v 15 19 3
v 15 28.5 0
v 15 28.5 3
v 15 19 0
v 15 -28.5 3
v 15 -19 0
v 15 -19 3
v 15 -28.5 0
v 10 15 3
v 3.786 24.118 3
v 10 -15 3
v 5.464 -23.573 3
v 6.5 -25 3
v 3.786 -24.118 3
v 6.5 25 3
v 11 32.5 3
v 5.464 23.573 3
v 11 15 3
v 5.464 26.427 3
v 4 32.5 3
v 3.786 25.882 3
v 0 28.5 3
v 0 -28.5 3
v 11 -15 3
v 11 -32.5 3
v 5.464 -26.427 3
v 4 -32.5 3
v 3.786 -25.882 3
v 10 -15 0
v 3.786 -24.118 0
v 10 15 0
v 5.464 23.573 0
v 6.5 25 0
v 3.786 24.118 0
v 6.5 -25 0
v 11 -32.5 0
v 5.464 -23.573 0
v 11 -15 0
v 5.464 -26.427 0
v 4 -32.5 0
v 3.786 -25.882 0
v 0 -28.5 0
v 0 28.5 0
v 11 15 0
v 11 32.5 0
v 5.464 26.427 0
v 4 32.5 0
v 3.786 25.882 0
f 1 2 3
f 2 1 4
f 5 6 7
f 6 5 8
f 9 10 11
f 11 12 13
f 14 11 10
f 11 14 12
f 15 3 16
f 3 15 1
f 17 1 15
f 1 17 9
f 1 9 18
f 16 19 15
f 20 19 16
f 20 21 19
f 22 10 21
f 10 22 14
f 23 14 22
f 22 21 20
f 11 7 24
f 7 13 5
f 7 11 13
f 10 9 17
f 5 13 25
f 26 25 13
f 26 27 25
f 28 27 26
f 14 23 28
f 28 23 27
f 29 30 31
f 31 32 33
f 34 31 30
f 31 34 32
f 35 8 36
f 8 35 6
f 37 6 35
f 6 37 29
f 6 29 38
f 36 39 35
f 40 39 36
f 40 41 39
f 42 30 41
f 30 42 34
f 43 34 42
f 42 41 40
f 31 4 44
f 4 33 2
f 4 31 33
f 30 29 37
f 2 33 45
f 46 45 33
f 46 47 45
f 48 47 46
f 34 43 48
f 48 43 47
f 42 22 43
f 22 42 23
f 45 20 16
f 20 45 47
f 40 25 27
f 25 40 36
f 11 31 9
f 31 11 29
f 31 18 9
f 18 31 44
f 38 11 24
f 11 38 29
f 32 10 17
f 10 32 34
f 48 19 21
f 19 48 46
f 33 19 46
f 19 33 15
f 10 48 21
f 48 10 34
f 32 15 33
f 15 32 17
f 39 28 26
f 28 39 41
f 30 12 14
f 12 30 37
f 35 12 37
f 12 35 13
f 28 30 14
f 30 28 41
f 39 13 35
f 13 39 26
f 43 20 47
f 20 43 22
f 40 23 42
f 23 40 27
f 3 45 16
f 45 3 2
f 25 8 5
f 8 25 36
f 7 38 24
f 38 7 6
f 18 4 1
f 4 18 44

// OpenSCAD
// file: config_4x5.scad
/*
This is the base configuration file for the 4x5" format
# we are not using the exact ANSI measures, but slightly rounded measures for slight simplification
*/
vStabilizerTotal_h = 7;

// general tolerance
vTolerance = 0.2;

// sheet film and cassette measurements (roughly based on the ANSI measurements)
vFilmSheet_l = 127;
vFilmSheet_w = 102;
vCassette_l = 160; // A min
vCassette_w = 121; // B max
vCassette_h = 13.2; // C max
vLightTrap_l = 2; // M2
vLightTrap_w = vCassette_w;
vLightTrap_h = 1.5; // M1
vLightTrap_offsetX = 141; // G max
vFilmWindow_l = 121;
vFilmWindow_w = 101;
vFilmWindow_offsetX = 16;
vGroundGlass_offsetZ = 5;

// Graflok
vGraflok_h = 6; // this is not the official measurement, just measured from a camera 

// lens board measures (we are using Wista/Technika-style lensboards)
vLensboard_l = 100;
vLensboard_w = 97;
vLensboard_h = 2;
vLensboard_offsetX = -(vLensboard_l+3)/2; // caution: we have an asymetric offset!
vLensboard_offsetY = -vLensboard_w/2;
vLensboardHole_d = 85;
vLensboardLighttrap_d = 89;
vLensboardLighttrap_h = 1+vTolerance;

// bellows frame measures - the bellows frame design is derived from standardcameras.com
// back frame
vBellowsBackInner_l = 144; //???? check and replace with the measurement from your bellows!
vBellowsBackInner_w = vBellowsBackInner_l;
vBellowsBackOuter_l = vBellowsBackInner_l+1;
vBellowsBackOuter_w = vBellowsBackOuter_l;

vBellowsBackFrameOuter_l = 159;
vBellowsBackFrameOuter_w = vBellowsBackFrameOuter_l;
vBellowsBackFrameOuter_h = 7;
vBellowsBackFrameInner_l = 135;
vBellowsBackFrameInner_w = vBellowsBackFrameInner_l;
vBellowsBackFrameInner_h = 5;

vBellowsBackLightTrapOuter_l = vBellowsBackFrameInner_l+2*2;
vBellowsBackLightTrapOuter_w = vBellowsBackLightTrapOuter_l;
vBellowsBackLightTrap_h = 3;

//vBellowsBackFrameScrewHole_d = 2;
//vBellowsBackFrameScrewHole_h = 10;
vBellowsBackFrameScrewHole_offsetXY = 70;
vBellowsBackFrameScrewHole_offsetZ = vBellowsBackFrameOuter_h/2;

// front frame
vBellowsFrontInner_l = 94; //???? check and replace with the measurement from your bellows!
vBellowsFrontInner_w = vBellowsFrontInner_l;
vBellowsFrontOuter_l = vBellowsFrontInner_l+1;
vBellowsFrontOuter_w = vBellowsFrontOuter_l;

vBellowsFrontFrameOuter_l = 104;
vBellowsFrontFrameOuter_w = vBellowsFrontFrameOuter_l;
vBellowsFrontFrameOuter_h = 7;
vBellowsFrontFrameInner_l = 82;
vBellowsFrontFrameInner_w = vBellowsFrontFrameInner_l;
vBellowsFrontFrameInner_h = 5;

vBellowsFrontLightTrapOuter_l = vBellowsFrontFrameInner_l+2*2;
vBellowsFrontLightTrapOuter_w = vBellowsFrontLightTrapOuter_l;
vBellowsFrontLightTrap_h = 0;

//vBellowsFrontFrameScrewHole_d = 2;
//vBellowsFrontFrameScrewHole_h = 10;
vBellowsFrontFrameScrewHole_offsetXY = 40;
vBellowsFrontFrameScrewHole_offsetZ = vBellowsFrontFrameOuter_h/2;

// body dimensions
vWall_strength = 5;
vBodyOuter_l = 185; // make sure this is at least 4*vWall_strength larger than vBellowsBackFrameOuter_l!
vBodyOuter_w = 170; // make sure this is at least 2*vWall_strength larger than vBellowsBackFrameOuter_l!
vBodyOuter_h = 65;
vBodyEdge_r = vWall_strength;

// we will center our model on the Y axis and on the center of the bellows frame
// at least for the 4x5 version, we have to do an asymetric offset of 2.5mm on the X-axis 
vAsymOffsetX = -2.5;  

// back plate
vBackPlateLength = 160; // we will probably use about the same size as the bellows back frame
vBackPlateStrength = vWall_strength;

// hinges for front lid
vHingeInnerDistance = 100;
vHingeBaseWidth = 20;
vHingeHole = 4;

// lid lock measures
vLidLockBase_d = 8;
vLidLockHole_distance = 70;

// rail dimensions
vLowerRail_w = 90;
vUpperRail_w = vLowerRail_w;

// cutout for stop indents
vStopIndent_l = 4;
vStopIndent_h = 5;
vStopIndentDistance = 25; // shorter than 25 is not necessary
vStopIndent_offsetX = 20; // don't go shorter than 20 if you intend to use a 90mm lens!

// for all dovetails we use a base width of 5mm and a base height of 5mm
// we are applying tolerances to the inner AND outer part of a dovetail, in width and height
vDoveTail_w = 5;
vDoveTail_h = 5;
vDoveTail_tolerance = 0.2;

// front standard carrier / slider
// width is depending on vUpperRail_w
vSliderBase_w = vUpperRail_w + (4*vDoveTail_w);
vSliderBase_l = 40; // make sure to have enough space in the body.


// lever plate 
vLeverPlateBase_w = vUpperRail_w - (8*vDoveTail_w);
vLeverPlateBlock_w = 25;
vLeverPlateBlock_l = vSliderBase_l-(2*vDoveTail_w);

vFrontStandard_h = 130;
vFrontStandardSlot_h = vFrontStandard_h - 30;

// lensboard carrier
vFrontPlate_length = vSliderBase_w+6; // vSliderBase_w is a bit too tight for 4x5", so there we will add 5mm, for 5x7 vSliderBase_w is OK to get a squared lensboard carrier
vFrontPlate_width = vSliderBase_w; //vFrontPlate_length;
vFrontPlate_height = 16;
vEdgeCutCylinder = floor(sqrt(2*pow(vFrontPlate_width,2)))-5;

vTiltDovetailBase_d1 = 30;
vTiltDovetailBase_d2 = vTiltDovetailBase_d1+(2*vDoveTail_w);
vTiltDovetailBaseBlock_d = vTiltDovetailBase_d1+(4*vDoveTail_w);

vTiltDovetail_d1 = vTiltDovetailBase_d1-vTolerance;
vTiltDovetail_d2 = vTiltDovetailBase_d2-vTolerance;
vTiltDovetail_h = vDoveTail_w-vTolerance;

vTiltDovetailCutout_d1 = vTiltDovetailBase_d2+vTolerance;
vTiltDovetailCutout_d2 = vTiltDovetailBase_d1+vTolerance;

vAxisHole_d = 10+vTolerance;
vAxisHole_h = vDoveTail_w+vTolerance;

vTiltLockBolt_d = 12;
vTiltLockBolt_h = 14;
//vTiltLockBoltHole_d = 8;
//vTiltLockBoltHole_h = vTiltLockBolt_h;

vTiltHeight = 50;
vTiltRadius = vFrontPlate_length/2;
vTiltAngleMinus = -7;
vTiltAnglePlus = 7;
vTiltAxis_d = 10-vTolerance;

// focusing rod
vFocusingRod_d = 6;
vFocusingKnob_d = 25;
vFocusingKnob_h = 20;

// stabilizer measures (just the outer measures of our stabilizer block, not the tripod slider)
vStabilizerBase_l = 135;
vStabilizerBase_w = 90;  
vStabilizerBase_h = 7;
vStabilizerDovetailBase_w = 50;
// screw holes for the stabilizer
vLidHoleCount_x = 4;
vLidHoleDist_x = 35;
vLidHoleCount_y = 2;
vLidHoleDist_y = 60;


// screw diameters, length is individually set
vScrew1Hole_d = 3;
vScrew1ThreadHole_d = 2.2;
vScrew2Hole_d = 2;
vScrew2ThreadHole_d = 1.4;


// Dimensions for small heat set insert holes.
// Sized for M2 inserts, 3 mm depth, 3.5 mm max OD
// (may be labelled M2x3.5x3)
vInsertM2Hole_d = 3.2;
vInsertM2MinDepth_h = 4.0;
vInsertM2Size_d = 3.5;
vInsertM2Depth_h = 3.0;

// Dimensions for heat set insert holes.
// Sized for "Voron standard" M3 inserts, 4 mm depth, 5 mm max OD
// (variously labelled M3x4x5 or M3x5x4)
vInsertM3Hole_d = 4.7;
vInsertM3MinDepth_h = 5.0;
vInsertM3Size_d = 5.0;
vInsertM3Depth_h = 4.0;

// Dimensions for large heat set insert holes.
// Sized for M5 inserts, 5 mm depth, 7 mm max OD
// (may be labelled M5x7x5)
vInsertM5Hole_d = 6.7;
vInsertM5MinDepth_h = 6.0;
vInsertM5Size_d = 7.0;
vInsertM5Depth_h = 5.0;
// file: baseconfig.scad
/*
Here we define some variables which are independent from the camera format
*/


// some generic variables

// we are including a format specific configuration sheet - but make sure to include only one!

include <config_4x5.scad>;
// include <config_5x7.scad>;
// include <config_8x10.scad>;

// Arca Swiss tripod plate
// caution: some Arca Swiss compatible tripod heads may have slight variations
// vArca_length = xx; // the length is irrelevant here
vArca_width = 38;
vArca_height = 7;
vArcaBase_cutout = 4;
vArcaBase_height = 1.5;
// file: modules.scad
/*
This is a collection of the modules which are used heavily within the whole project.
Almost all parts rely on the modules to remain "as is", especially regarding their current orientation.
So please act very carefully here, otherwise you may screw up the complete design!

*/
include <baseconfig.scad>;


// roof module - this is heavily used for dovetail cutouts
// please keep as is
module roof(l, w, h){
    polyhedron(
        points=[
            [0,0,0],
            [l,0,0],
            [l,w,0],
            [0,w,0],
            [0,w/2,h],
            [l,w/2,h]
            ],
        faces=[
            [0,1,2,3],
            [0,4,1],
            [1,4,5,2],
            [2,5,3],
            [3,5,4,0]
            ]
            );
    };

// a wedge module - this is heavily used for cutting edges
// please keep as is    
module wedge(l, w, h) {
    polyhedron(
            points=[
                [0,0,0],
                [l,0,0],
                [l,w,0],
                [0,w,0],
                [0,0,h],
                [l,0,h]
            ],
            faces=[
                [0,3,2,1],
                [0,1,5,4],
                [1,2,5],
                [2,3,4,5],
                [3,0,4]
            ]
    );
   };

// simple tube module.   
module tube(d1, d2, h) {
    difference() {
        cylinder(d=d1, h=h);
        cylinder(d=d2, h=h);
        };
    };

// mainly used for making holes for countersunk screws
// please keep as is    
module countersunk_screw(vScrew_d, vScrew_l){
    union(){
    cylinder(d=vScrew_d, h=vScrew_l);
    cylinder(d1=vScrew_d*2, d2=0, h=vScrew_d);
    };
};

// module for making hexagons, e.g. hex nuts. kw is the key width
// please keep as is
module hex(kw, h) {
	render()
        translate([0, 0, h/2])
            intersection_for(a = [0, 120, 240]) {
                rotate([0, 0, a])
                    cube([kw, 3 * kw, h], true);
                }
}


// Heatset insert
// d: Thread diameter
// od: Outer diameter
// l: Total length
module insert(d, od, l)
{
    echo(Insert = d, od, l);
    difference() {
        cylinder(l, d=od, $fn=15);
        translate([0, 0, -0.5]) cylinder(l+1, d=d, $fn=15);
        };
}

module insert_m2()
{
    color("gold") insert(2, vInsertM2Size_d, vInsertM2Depth_h);
}

module insert_m3()
{
    color("gold") insert(3, vInsertM3Size_d, vInsertM3Depth_h);
}

module insert_m5()
{
    color("gold") insert(5, vInsertM5Size_d, vInsertM5Depth_h);
}

// Countersunk screw, metric, for display
// Example: https://www.aliexpress.com/item/1005007838338973.html
module screw_cs(l, d=3, dk=6, s=2, t=1) {
    // l: total length (including head) in mm
    // d: thread diameter (eg 3 for M3)
    // dk: max head diameter
    // s: hex socket flat-to-flat size
    // t: hex socket depth
    echo(CountersunkScrew = d, l);
    difference() {
        union() {
            cylinder(h=l, r=d/2, $fn=15);
            cylinder(h=(dk-d)/2, r1=dk/2, r2=d/2, $fn=15);
            }
        cylinder(h=t, r=s/2*2/sqrt(3), $fn=6);
    }
}

module screw_m3_cs(l) {
    color("silver") screw_cs(l, d=3, dk=6, s=2, t=1);
}

module screw_m2_cs(l) {
    color("silver") screw_cs(l, d=2, dk=3.8, s=1.5, t=0.75);
}
module screw_m5_cs(l) {
    color("silver") screw_cs(l, d=5, dk=9.5, s=3, t=1.6);
}

// Button head screw, metric, for display
// Example: https://www.aliexpress.com/item/32967225441.html
module screw_bh(l, d=3, k=1.5, dk=5.5, s=2, t=1) {
    // l: shaft length (NOT including head) in mm
    // d: thread diameter (eg 3 for M3)
    // k: head depth
    // dk: head max diameter
    // s: hex socket flat-to-flat size
    // t: hex socket depth
    echo(ButtonheadScrew = d, l);
    difference() {
        union() {
            translate([0, 0, k]) cylinder(h=l, r=d/2, $fn=15);
            difference() {
                translate([0, 0, k]) intersection() {
                    sphere(d=dk, $fn=15);
                    translate([-dk/2, -dk/2, -dk]) cube(dk);
                }
                translate([-dk/2, -dk/2, -dk]) cube(dk);
            }
        }
        cylinder(h=t, r=s/2*2/sqrt(3), $fn=6);
    }
}

module screw_m2_bh(l) {
    color("silver") screw_bh(l, d=2, dk=3.4, s=1.175, t=0.6);
}

module screw_m3_bh(l) {
    color("silver") screw_bh(l, d=3, dk=5.7, s=2, t=1);
}


module nut_m5() {
    echo(Nut = 5);
    difference() {
        rotate([0, 0, 30]) cylinder(h=3.9, d=8*2/sqrt(3), $fn=6);
        cylinder(h=5, d=5, $fn=15);
        }
    }
    
    
module thumbscrew(bolt_d, bolt_dk, screw_d, screw_h, n_knurls, knurl_d, knurl_f) {
    // bolt_d:  central bolt diameter
    // bolt_dk: bolt head max diameter
    // screw_d: thumbscrew outer diameter
    // screw_h: thumbscrew height
    // n_knurls: number of knurls
    
    min_knurl_offset = screw_d/2 - knurl_d;
    max_knurl_offset = screw_d/2 + knurl_d;
    knurl_offset = min_knurl_offset + knurl_f*(max_knurl_offset - min_knurl_offset);
    
    difference()
    {
        union()
        {
            translate([0, 0, 1]) cylinder(screw_h-2, d=screw_d);
            cylinder(1, d1=screw_d-1, d2=screw_d);
            translate([0, 0, screw_h-1]) cylinder(1, d1=screw_d, d2=screw_d-1);
        }
        cylinder(screw_h, d=bolt_d);
        cylinder(bolt_dk/2, d1=bolt_dk, d2=0);
        for (i = [1:n_knurls])
        {
            rotate([0, 0, i*360/(n_knurls)]) translate([knurl_offset, 0, 0]) cylinder(screw_h, d=knurl_d);
        }
    }
}

module thumbscrew_m5(screw_d, screw_h, n_knurls, knurl_d, knurl_f) {
    thumbscrew(5, 9.5, screw_d, screw_h, n_knurls, knurl_d, knurl_f);
}


module t6_flange_coupler() {
    // T6 flange coupler
    // Example: https://www.aliexpress.com/item/1005008049363389.html
    echo(FlangeCoupler = 6);
    difference() {
        union() {
            translate([0, 0, 2]) cylinder(h=10, d=10);
            cylinder(h=2, d=22);
        }
        cylinder(h=12, d=6);
        translate([0, 15, 7]) rotate([90, 0, 0]) cylinder(h=30, d=3);
        for (i = [0:3]) {
            rotate([0, 0, 45+90*i]) translate([-8, 0, 0]) cylinder(h=2, d=3);
        }
    }
}


module AXK0619_thrust_bearing() {
    echo(ThrustBearing = "AXK0619");
    difference() {
        cylinder(h=4, d=19);
        cylinder(h=4, d=6);
    }
}


module t6_lead_screw(l) {
    echo(LeadScrewT6 = l);
    color("silver") cylinder(h=l, d=6);
}

module t6_lead_screw_nut() {
    echo("LeadScrewT6Nut");
    intersection()
    {
        difference() {
            union() {
                cylinder(h=15, d=12);
                translate([0, 0, 1.5]) cylinder(h=3.5, d=24);
            }
            cylinder(h=15, d=6);
        }  
        translate([-50, -12.5/2, -50]) cube([100, 12.5, 100]);
    }
}

module threaded_rod_m5(l) {
    echo(ThreadedRodM5 = l);
    color("silver") cylinder(h=l, d=5);
}

module smooth_rod_m4(l) {
    echo(SmoothRodM4 = l);
    color("silver") cylinder(h=l, d=4);
}


module screw_m3_grub(l) {
    echo(GrubScrew = 3, l);
    color("silver") cylinder(h=l, d=3, $fn=15);
}


module screw_m5_grub(l) {
    echo(GrubScrew = 5, l);
    color("silver") cylinder(h=l, d=5, $fn=15);
}


module washer_m6() {
    // M6x12x0.8 washer
    echo(Washer = 6, 0.8);
    difference() {
        cylinder(h=0.8, d=12);
        cylinder(h=0.8, d=6.6);
    }
}


module springwasher_m6() {
    // M6x12x1.5 washer (compresses to 0.5)
    // Show as compressed (~0.5 mm height)
    echo(SpringWasher = 6);
    difference() {
        cylinder(h=0.5, d=12);
        cylinder(h=0.6, d=6);
    }
}
// main file
// some modules such as hex, countersunk screws, roof, wedge are available in a module file
use <modules.scad>;

module lensboard_lower_clamp() {

// variables

vClampBase_l = 15;
vClampBase_w = 65;
vClampBase_h = 3;
vClampBase_offsetX = 0;
vClampBase_offsetY = -vClampBase_w/2;
vClampBase_offsetZ = 0;

vClampCutout_l = 5;
vClampCutout_w = 30;
vClampCutout_h = vClampBase_h;
vClampCutout_offsetX = 10;
vClampCutout_offsetY = -vClampCutout_w/2;
vClampCutout_offsetZ = 0;

vScrewHole_d = 3;
vScrewHole_h = vClampBase_h;
vScrewHole_offsetX = 5;
vScrewHole_offsetY = 25;
vScrewHole_offsetZ = 0;

vEdgeCut = 4;
vEdgeCut_h = vClampBase_h;
vEdgeCut_offsetX1 = 0;
vEdgeCut_offsetX2 = vClampBase_l;
vEdgeCut_offsetY1 = vClampBase_w/2;
vEdgeCut_offsetY2 = vClampCutout_w/2;
vEdgeCut_offsetZ = 0;



difference(){
    // base plate
    translate([vClampBase_offsetX, vClampBase_offsetY, vClampBase_offsetZ])
        cube([vClampBase_l, vClampBase_w, vClampBase_h]);
    
    // cutout
    translate([vClampCutout_offsetX, vClampCutout_offsetY, vClampCutout_offsetZ])
        cube([vClampCutout_l, vClampCutout_w, vClampCutout_h]);
    
    // screw holes
    translate([vScrewHole_offsetX, vScrewHole_offsetY, vScrewHole_offsetZ])
        cylinder(d=vScrewHole_d, h=vScrewHole_h);
    translate([vScrewHole_offsetX, -vScrewHole_offsetY, vScrewHole_offsetZ])
        cylinder(d=vScrewHole_d, h=vScrewHole_h);
    
    // edge cut
    translate([vEdgeCut_offsetX1, vEdgeCut_offsetY1, vEdgeCut_offsetZ])
        rotate([0, 270, 0])
            wedge(vEdgeCut_h, -vEdgeCut, -vEdgeCut);
    
    translate([vEdgeCut_offsetX1, -vEdgeCut_offsetY1, vEdgeCut_offsetZ])
        rotate([0, 270, 0])
            wedge(vEdgeCut_h, vEdgeCut, -vEdgeCut);
    
    translate([vEdgeCut_offsetX2, vEdgeCut_offsetY1, vEdgeCut_offsetZ])
        rotate([0, 270, 0])
            wedge(vEdgeCut_h, -vEdgeCut, vEdgeCut);
    
    translate([vEdgeCut_offsetX2, -vEdgeCut_offsetY1, vEdgeCut_offsetZ])
        rotate([0, 270, 0])
            wedge(vEdgeCut_h, vEdgeCut, vEdgeCut);
            
    translate([vEdgeCut_offsetX2, -vEdgeCut_offsetY2, vEdgeCut_offsetZ])
        rotate([0, 270, 0])
            wedge(vEdgeCut_h, -vEdgeCut, vEdgeCut);
    
    translate([vEdgeCut_offsetX2, vEdgeCut_offsetY2, vEdgeCut_offsetZ])
        rotate([0, 270, 0])
            wedge(vEdgeCut_h, vEdgeCut, vEdgeCut);        
    
}

};

lensboard_lower_clamp();
